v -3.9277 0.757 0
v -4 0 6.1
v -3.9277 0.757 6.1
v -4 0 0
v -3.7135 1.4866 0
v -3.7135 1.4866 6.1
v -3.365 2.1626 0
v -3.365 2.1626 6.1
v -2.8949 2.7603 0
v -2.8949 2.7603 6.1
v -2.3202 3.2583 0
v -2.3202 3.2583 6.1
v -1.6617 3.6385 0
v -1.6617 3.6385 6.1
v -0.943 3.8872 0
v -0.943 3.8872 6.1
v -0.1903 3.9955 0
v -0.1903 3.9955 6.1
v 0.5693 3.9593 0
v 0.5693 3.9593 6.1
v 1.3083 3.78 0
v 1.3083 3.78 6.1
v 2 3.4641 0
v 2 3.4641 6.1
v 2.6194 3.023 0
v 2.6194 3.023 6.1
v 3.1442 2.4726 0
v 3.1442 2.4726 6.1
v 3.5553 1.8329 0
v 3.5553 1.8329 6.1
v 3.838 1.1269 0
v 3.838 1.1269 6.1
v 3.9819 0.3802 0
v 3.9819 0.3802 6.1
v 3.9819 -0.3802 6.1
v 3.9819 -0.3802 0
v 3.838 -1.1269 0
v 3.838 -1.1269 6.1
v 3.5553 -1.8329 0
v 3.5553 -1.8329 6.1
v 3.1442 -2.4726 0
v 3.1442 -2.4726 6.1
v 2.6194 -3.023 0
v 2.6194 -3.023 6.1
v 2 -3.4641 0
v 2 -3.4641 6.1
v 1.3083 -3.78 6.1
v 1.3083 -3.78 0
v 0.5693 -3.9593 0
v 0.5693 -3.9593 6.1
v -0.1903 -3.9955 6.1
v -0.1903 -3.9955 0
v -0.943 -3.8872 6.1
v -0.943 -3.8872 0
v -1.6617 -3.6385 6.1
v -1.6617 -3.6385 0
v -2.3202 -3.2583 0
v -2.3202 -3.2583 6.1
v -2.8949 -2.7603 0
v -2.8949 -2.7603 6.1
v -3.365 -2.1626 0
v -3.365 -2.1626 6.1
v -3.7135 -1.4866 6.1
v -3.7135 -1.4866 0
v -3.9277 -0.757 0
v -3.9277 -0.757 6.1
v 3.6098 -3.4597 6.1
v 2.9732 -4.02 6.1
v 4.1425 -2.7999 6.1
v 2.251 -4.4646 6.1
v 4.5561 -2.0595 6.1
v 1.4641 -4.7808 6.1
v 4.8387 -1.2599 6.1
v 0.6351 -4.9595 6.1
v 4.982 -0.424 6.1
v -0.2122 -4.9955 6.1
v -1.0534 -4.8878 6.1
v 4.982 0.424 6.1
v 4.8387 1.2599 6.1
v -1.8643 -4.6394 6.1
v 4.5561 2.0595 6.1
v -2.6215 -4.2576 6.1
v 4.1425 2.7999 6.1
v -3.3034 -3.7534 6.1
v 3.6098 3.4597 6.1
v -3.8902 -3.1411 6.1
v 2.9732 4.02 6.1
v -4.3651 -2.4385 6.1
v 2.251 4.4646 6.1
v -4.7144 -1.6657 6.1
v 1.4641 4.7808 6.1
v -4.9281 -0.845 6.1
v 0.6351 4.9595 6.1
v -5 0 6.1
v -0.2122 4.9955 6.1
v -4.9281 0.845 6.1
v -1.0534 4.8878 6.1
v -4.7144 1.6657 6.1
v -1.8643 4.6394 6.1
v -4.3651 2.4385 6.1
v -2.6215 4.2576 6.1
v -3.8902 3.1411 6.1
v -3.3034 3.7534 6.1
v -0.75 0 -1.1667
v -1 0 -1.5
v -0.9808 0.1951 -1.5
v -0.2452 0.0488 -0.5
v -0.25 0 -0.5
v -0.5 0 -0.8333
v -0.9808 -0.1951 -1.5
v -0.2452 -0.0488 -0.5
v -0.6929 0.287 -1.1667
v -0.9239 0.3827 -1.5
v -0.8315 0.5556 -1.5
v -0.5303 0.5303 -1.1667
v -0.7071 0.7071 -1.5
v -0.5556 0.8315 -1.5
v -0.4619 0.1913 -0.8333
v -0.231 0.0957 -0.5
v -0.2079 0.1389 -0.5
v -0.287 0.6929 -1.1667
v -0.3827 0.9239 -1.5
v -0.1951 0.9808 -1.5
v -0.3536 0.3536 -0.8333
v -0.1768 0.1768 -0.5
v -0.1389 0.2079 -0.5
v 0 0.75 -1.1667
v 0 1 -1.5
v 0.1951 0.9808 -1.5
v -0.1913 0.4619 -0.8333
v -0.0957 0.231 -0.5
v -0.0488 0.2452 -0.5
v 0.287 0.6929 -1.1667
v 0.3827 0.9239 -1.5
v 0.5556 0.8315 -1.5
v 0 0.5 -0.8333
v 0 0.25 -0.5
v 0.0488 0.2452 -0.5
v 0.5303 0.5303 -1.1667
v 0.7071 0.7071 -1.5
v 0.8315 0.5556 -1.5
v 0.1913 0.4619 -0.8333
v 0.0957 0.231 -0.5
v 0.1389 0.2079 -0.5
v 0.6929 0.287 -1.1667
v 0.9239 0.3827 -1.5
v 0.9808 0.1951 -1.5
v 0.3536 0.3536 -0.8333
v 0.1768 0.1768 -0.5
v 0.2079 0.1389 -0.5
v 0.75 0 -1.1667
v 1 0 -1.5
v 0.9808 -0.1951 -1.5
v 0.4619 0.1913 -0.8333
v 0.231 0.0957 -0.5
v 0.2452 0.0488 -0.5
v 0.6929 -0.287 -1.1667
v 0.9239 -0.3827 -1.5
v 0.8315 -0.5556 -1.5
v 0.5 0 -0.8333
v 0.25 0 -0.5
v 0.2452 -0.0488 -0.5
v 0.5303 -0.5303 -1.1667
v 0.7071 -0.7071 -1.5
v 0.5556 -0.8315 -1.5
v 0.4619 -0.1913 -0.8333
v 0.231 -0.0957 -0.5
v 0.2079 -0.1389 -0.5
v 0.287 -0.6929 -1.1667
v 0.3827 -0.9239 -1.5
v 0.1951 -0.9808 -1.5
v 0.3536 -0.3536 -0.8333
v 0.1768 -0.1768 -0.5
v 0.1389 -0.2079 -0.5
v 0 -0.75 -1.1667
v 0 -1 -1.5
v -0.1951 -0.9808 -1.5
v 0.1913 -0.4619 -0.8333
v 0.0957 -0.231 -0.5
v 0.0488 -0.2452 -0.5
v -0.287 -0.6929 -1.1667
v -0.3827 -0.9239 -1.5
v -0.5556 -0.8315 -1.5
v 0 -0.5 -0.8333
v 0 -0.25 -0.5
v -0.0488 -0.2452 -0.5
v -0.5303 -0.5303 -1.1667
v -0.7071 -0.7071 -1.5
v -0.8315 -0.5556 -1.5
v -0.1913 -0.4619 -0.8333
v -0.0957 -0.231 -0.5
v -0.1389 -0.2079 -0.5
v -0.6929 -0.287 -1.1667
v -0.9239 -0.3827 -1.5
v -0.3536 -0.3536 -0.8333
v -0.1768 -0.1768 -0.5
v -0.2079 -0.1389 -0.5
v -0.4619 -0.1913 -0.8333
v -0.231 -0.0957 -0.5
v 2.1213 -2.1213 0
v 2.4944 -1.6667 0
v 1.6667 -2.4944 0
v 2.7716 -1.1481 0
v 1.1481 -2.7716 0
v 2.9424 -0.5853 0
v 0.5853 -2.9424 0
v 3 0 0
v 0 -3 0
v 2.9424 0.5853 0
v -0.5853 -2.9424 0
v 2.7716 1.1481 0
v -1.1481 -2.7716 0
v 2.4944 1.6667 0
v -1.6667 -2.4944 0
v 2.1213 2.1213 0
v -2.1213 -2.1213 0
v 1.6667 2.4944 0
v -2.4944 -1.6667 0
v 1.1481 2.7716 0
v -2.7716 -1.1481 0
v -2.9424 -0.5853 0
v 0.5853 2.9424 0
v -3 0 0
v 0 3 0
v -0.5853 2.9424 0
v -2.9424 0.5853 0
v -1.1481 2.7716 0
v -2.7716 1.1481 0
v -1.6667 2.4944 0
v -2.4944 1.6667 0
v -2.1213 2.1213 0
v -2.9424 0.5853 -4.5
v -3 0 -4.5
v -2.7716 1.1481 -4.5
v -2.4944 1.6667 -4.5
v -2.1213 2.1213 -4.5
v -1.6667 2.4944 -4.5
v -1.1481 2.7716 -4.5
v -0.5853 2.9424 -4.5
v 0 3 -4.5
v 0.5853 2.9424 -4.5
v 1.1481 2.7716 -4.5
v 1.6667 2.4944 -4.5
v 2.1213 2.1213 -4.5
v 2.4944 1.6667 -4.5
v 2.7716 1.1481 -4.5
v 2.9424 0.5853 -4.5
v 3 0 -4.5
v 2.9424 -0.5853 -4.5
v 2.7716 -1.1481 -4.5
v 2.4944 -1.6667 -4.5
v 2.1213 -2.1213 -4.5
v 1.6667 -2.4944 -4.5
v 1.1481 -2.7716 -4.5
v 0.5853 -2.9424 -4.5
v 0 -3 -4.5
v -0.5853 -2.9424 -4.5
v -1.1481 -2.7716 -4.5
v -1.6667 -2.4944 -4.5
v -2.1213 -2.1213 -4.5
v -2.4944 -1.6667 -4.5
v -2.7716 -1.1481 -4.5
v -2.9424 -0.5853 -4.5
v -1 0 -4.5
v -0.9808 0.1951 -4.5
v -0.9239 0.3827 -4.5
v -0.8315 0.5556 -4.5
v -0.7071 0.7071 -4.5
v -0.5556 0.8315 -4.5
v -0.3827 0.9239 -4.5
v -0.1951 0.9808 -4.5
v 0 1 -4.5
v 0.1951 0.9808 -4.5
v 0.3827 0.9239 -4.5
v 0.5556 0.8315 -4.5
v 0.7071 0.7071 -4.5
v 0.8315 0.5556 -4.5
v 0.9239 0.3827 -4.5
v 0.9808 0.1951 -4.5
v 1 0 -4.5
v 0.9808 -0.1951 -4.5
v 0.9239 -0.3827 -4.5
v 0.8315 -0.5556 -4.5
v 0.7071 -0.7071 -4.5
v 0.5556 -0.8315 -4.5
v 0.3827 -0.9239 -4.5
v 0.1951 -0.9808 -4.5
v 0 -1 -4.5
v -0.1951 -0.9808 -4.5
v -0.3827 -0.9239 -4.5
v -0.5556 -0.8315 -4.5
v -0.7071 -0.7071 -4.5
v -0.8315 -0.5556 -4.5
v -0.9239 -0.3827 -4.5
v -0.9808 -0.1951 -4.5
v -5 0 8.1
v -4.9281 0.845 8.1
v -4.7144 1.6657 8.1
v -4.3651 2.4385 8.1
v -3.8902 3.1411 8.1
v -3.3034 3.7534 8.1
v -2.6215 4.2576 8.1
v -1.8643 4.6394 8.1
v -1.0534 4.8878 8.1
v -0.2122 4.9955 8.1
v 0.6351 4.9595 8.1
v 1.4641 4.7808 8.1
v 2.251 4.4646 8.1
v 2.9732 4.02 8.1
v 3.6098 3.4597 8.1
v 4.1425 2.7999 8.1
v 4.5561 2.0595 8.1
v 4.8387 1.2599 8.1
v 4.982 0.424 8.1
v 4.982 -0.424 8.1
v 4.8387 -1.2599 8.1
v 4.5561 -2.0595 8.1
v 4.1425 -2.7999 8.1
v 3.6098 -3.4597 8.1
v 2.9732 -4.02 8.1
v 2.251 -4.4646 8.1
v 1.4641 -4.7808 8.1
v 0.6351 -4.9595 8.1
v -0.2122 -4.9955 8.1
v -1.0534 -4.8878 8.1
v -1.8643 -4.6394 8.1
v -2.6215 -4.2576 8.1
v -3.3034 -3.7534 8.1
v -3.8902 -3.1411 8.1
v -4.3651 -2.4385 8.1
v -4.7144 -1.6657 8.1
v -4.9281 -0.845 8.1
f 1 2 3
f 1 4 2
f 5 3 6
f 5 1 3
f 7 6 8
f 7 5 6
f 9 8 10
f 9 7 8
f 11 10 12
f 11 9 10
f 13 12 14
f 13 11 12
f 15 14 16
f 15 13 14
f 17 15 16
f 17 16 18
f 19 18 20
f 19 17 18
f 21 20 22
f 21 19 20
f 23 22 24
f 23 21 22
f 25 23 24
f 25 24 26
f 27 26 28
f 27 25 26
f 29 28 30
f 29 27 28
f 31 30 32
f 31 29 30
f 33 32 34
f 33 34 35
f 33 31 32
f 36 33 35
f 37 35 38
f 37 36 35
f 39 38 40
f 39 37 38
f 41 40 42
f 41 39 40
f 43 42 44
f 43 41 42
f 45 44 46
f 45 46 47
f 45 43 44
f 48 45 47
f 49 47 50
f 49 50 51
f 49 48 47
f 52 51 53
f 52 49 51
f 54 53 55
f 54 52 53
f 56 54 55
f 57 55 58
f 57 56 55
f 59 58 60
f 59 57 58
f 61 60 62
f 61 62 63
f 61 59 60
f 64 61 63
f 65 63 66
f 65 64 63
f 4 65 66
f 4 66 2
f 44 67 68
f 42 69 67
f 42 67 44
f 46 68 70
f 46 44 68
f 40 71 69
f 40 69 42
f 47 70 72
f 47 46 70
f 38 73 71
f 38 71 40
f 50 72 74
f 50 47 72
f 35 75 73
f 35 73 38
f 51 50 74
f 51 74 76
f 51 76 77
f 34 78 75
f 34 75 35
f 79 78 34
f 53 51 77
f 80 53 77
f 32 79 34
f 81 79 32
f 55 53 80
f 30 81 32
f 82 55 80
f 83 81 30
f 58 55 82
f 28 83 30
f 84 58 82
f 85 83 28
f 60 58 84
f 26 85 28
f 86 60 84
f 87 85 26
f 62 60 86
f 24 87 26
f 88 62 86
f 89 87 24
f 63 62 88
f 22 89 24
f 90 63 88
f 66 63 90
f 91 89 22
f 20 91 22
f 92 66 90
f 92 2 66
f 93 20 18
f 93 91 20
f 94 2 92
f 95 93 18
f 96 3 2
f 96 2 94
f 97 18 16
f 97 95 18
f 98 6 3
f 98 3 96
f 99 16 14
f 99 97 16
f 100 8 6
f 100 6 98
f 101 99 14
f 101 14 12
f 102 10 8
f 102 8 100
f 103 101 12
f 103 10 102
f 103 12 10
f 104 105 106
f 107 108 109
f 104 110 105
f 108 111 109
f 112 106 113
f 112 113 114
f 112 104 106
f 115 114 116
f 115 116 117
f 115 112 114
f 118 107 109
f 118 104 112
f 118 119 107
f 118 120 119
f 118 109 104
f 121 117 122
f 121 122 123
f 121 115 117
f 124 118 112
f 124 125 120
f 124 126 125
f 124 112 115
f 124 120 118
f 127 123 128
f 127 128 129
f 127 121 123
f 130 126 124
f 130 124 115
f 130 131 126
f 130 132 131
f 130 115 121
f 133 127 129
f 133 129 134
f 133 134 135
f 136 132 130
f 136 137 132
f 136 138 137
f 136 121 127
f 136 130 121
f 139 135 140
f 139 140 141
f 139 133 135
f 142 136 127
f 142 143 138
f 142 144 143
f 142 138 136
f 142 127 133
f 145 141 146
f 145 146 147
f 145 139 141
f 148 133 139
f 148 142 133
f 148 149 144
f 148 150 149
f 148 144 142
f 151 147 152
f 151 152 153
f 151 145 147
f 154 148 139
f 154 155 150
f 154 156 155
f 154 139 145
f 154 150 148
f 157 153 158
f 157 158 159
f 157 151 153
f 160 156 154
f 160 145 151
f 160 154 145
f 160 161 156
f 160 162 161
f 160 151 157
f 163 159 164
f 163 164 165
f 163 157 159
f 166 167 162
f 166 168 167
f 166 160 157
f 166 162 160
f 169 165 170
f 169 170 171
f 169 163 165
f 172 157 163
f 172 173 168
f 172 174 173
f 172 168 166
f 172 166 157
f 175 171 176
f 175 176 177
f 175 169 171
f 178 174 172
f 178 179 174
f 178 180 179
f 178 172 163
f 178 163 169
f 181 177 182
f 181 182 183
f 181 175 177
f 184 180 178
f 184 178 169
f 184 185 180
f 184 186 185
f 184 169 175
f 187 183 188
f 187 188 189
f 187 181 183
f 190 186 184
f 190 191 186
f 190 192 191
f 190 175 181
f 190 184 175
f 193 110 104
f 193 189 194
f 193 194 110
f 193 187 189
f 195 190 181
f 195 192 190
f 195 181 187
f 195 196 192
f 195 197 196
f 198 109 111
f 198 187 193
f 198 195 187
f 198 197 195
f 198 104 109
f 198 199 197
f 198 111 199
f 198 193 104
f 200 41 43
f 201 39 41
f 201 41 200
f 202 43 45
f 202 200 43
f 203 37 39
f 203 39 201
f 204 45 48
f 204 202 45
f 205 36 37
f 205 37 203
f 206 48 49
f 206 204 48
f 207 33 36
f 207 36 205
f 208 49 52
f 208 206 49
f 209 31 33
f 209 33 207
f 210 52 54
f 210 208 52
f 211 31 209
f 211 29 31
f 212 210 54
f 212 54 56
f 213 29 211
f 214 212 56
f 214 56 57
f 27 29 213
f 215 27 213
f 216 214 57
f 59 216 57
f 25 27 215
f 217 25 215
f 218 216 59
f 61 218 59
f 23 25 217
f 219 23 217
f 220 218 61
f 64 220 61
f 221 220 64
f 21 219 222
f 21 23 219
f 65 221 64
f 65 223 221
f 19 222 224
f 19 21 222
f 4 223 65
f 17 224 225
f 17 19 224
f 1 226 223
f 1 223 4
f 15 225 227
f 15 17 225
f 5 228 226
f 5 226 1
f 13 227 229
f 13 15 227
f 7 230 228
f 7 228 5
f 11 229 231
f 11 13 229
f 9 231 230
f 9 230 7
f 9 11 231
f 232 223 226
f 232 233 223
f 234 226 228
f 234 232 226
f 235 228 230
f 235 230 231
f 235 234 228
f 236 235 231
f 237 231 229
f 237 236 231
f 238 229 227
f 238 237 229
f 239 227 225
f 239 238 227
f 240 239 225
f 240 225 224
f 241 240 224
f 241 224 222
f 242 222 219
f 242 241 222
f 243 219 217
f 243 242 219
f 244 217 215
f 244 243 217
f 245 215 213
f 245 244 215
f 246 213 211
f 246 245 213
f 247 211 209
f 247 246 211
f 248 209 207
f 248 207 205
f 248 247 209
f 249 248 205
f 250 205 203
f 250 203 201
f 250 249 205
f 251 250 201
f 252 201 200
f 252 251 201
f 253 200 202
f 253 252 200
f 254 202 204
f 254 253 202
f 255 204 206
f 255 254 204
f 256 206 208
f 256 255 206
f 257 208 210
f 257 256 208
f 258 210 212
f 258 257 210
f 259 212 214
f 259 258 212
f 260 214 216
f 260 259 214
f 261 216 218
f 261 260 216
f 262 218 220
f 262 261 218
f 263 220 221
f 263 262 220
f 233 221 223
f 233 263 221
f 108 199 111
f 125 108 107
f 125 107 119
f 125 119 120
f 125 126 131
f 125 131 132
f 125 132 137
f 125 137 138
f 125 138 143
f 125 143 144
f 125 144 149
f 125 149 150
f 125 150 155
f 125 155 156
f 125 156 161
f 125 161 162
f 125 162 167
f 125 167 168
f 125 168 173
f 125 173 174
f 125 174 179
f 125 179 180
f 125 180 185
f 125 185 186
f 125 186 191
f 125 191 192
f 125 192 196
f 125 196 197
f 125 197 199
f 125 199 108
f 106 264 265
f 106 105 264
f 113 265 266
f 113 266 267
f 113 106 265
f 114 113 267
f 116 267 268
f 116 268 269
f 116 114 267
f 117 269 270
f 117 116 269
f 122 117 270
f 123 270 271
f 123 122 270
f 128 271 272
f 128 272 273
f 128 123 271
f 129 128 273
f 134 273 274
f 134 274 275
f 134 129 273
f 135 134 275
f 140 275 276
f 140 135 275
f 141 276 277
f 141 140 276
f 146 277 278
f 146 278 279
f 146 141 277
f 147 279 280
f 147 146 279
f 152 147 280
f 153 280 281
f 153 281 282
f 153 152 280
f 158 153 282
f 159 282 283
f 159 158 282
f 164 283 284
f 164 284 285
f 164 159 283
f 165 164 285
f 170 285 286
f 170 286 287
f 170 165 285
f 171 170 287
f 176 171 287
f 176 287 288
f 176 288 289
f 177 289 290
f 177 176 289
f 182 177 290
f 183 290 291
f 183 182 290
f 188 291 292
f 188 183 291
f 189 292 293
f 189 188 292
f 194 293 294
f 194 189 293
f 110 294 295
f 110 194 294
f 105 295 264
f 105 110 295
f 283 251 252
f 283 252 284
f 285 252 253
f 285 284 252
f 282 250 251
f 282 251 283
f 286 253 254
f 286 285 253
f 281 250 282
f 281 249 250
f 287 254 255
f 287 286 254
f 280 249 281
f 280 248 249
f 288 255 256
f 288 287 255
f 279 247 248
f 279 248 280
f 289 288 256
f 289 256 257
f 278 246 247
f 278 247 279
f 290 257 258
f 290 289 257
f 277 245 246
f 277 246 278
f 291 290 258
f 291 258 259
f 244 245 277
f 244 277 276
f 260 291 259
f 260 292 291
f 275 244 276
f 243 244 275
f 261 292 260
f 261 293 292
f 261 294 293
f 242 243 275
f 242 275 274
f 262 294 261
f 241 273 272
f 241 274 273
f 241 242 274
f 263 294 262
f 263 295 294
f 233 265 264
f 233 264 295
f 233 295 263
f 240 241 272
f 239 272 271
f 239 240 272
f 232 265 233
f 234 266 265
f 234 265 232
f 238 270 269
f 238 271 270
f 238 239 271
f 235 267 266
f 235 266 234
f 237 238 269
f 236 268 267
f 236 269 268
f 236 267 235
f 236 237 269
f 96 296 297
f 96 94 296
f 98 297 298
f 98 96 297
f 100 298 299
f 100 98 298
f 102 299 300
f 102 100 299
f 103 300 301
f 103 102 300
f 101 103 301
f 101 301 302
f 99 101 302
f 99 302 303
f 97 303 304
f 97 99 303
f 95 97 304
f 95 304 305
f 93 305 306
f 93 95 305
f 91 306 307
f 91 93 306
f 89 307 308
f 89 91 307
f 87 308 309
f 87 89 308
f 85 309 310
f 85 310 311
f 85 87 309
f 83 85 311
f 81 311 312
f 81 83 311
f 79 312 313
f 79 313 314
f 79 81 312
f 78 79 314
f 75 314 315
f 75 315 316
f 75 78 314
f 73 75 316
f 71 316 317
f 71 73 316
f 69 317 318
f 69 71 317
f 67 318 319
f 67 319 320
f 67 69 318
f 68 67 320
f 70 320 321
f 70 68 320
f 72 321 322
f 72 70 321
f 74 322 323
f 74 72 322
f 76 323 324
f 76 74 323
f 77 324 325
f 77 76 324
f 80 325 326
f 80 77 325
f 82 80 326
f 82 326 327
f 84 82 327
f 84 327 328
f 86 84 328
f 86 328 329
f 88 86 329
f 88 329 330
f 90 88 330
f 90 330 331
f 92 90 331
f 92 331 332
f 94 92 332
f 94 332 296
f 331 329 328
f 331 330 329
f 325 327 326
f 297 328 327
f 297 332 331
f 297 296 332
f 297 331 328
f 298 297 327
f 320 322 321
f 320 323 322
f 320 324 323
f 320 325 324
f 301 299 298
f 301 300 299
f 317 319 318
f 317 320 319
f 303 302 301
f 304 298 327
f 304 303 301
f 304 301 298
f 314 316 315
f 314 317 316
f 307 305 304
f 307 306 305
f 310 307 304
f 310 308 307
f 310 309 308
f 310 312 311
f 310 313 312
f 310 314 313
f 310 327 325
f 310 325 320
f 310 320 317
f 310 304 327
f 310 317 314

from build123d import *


with BuildPart() as f1:
    # F0 (on Front) → F1 (revolve)
    with BuildSketch(Plane.XZ):
        Polygon((0, 6.1), (0, 8.1), (-5, 8.1), (-5, 6.1), (-4, 6.1), align=None)
        Polygon((0, 0), (0, 6.1), (-4, 6.1), (-4, 0), (-3, 0), align=None)
        Polygon((0, -0.5), (0, 0), (-3, 0), (-3, -4.5), (-1, -4.5), (-1, -1.5), (-0.25, -0.5), align=None)
    revolve(axis=Axis((0, 0, 3.8), (0, 0, -1)))


solid = f1.part
